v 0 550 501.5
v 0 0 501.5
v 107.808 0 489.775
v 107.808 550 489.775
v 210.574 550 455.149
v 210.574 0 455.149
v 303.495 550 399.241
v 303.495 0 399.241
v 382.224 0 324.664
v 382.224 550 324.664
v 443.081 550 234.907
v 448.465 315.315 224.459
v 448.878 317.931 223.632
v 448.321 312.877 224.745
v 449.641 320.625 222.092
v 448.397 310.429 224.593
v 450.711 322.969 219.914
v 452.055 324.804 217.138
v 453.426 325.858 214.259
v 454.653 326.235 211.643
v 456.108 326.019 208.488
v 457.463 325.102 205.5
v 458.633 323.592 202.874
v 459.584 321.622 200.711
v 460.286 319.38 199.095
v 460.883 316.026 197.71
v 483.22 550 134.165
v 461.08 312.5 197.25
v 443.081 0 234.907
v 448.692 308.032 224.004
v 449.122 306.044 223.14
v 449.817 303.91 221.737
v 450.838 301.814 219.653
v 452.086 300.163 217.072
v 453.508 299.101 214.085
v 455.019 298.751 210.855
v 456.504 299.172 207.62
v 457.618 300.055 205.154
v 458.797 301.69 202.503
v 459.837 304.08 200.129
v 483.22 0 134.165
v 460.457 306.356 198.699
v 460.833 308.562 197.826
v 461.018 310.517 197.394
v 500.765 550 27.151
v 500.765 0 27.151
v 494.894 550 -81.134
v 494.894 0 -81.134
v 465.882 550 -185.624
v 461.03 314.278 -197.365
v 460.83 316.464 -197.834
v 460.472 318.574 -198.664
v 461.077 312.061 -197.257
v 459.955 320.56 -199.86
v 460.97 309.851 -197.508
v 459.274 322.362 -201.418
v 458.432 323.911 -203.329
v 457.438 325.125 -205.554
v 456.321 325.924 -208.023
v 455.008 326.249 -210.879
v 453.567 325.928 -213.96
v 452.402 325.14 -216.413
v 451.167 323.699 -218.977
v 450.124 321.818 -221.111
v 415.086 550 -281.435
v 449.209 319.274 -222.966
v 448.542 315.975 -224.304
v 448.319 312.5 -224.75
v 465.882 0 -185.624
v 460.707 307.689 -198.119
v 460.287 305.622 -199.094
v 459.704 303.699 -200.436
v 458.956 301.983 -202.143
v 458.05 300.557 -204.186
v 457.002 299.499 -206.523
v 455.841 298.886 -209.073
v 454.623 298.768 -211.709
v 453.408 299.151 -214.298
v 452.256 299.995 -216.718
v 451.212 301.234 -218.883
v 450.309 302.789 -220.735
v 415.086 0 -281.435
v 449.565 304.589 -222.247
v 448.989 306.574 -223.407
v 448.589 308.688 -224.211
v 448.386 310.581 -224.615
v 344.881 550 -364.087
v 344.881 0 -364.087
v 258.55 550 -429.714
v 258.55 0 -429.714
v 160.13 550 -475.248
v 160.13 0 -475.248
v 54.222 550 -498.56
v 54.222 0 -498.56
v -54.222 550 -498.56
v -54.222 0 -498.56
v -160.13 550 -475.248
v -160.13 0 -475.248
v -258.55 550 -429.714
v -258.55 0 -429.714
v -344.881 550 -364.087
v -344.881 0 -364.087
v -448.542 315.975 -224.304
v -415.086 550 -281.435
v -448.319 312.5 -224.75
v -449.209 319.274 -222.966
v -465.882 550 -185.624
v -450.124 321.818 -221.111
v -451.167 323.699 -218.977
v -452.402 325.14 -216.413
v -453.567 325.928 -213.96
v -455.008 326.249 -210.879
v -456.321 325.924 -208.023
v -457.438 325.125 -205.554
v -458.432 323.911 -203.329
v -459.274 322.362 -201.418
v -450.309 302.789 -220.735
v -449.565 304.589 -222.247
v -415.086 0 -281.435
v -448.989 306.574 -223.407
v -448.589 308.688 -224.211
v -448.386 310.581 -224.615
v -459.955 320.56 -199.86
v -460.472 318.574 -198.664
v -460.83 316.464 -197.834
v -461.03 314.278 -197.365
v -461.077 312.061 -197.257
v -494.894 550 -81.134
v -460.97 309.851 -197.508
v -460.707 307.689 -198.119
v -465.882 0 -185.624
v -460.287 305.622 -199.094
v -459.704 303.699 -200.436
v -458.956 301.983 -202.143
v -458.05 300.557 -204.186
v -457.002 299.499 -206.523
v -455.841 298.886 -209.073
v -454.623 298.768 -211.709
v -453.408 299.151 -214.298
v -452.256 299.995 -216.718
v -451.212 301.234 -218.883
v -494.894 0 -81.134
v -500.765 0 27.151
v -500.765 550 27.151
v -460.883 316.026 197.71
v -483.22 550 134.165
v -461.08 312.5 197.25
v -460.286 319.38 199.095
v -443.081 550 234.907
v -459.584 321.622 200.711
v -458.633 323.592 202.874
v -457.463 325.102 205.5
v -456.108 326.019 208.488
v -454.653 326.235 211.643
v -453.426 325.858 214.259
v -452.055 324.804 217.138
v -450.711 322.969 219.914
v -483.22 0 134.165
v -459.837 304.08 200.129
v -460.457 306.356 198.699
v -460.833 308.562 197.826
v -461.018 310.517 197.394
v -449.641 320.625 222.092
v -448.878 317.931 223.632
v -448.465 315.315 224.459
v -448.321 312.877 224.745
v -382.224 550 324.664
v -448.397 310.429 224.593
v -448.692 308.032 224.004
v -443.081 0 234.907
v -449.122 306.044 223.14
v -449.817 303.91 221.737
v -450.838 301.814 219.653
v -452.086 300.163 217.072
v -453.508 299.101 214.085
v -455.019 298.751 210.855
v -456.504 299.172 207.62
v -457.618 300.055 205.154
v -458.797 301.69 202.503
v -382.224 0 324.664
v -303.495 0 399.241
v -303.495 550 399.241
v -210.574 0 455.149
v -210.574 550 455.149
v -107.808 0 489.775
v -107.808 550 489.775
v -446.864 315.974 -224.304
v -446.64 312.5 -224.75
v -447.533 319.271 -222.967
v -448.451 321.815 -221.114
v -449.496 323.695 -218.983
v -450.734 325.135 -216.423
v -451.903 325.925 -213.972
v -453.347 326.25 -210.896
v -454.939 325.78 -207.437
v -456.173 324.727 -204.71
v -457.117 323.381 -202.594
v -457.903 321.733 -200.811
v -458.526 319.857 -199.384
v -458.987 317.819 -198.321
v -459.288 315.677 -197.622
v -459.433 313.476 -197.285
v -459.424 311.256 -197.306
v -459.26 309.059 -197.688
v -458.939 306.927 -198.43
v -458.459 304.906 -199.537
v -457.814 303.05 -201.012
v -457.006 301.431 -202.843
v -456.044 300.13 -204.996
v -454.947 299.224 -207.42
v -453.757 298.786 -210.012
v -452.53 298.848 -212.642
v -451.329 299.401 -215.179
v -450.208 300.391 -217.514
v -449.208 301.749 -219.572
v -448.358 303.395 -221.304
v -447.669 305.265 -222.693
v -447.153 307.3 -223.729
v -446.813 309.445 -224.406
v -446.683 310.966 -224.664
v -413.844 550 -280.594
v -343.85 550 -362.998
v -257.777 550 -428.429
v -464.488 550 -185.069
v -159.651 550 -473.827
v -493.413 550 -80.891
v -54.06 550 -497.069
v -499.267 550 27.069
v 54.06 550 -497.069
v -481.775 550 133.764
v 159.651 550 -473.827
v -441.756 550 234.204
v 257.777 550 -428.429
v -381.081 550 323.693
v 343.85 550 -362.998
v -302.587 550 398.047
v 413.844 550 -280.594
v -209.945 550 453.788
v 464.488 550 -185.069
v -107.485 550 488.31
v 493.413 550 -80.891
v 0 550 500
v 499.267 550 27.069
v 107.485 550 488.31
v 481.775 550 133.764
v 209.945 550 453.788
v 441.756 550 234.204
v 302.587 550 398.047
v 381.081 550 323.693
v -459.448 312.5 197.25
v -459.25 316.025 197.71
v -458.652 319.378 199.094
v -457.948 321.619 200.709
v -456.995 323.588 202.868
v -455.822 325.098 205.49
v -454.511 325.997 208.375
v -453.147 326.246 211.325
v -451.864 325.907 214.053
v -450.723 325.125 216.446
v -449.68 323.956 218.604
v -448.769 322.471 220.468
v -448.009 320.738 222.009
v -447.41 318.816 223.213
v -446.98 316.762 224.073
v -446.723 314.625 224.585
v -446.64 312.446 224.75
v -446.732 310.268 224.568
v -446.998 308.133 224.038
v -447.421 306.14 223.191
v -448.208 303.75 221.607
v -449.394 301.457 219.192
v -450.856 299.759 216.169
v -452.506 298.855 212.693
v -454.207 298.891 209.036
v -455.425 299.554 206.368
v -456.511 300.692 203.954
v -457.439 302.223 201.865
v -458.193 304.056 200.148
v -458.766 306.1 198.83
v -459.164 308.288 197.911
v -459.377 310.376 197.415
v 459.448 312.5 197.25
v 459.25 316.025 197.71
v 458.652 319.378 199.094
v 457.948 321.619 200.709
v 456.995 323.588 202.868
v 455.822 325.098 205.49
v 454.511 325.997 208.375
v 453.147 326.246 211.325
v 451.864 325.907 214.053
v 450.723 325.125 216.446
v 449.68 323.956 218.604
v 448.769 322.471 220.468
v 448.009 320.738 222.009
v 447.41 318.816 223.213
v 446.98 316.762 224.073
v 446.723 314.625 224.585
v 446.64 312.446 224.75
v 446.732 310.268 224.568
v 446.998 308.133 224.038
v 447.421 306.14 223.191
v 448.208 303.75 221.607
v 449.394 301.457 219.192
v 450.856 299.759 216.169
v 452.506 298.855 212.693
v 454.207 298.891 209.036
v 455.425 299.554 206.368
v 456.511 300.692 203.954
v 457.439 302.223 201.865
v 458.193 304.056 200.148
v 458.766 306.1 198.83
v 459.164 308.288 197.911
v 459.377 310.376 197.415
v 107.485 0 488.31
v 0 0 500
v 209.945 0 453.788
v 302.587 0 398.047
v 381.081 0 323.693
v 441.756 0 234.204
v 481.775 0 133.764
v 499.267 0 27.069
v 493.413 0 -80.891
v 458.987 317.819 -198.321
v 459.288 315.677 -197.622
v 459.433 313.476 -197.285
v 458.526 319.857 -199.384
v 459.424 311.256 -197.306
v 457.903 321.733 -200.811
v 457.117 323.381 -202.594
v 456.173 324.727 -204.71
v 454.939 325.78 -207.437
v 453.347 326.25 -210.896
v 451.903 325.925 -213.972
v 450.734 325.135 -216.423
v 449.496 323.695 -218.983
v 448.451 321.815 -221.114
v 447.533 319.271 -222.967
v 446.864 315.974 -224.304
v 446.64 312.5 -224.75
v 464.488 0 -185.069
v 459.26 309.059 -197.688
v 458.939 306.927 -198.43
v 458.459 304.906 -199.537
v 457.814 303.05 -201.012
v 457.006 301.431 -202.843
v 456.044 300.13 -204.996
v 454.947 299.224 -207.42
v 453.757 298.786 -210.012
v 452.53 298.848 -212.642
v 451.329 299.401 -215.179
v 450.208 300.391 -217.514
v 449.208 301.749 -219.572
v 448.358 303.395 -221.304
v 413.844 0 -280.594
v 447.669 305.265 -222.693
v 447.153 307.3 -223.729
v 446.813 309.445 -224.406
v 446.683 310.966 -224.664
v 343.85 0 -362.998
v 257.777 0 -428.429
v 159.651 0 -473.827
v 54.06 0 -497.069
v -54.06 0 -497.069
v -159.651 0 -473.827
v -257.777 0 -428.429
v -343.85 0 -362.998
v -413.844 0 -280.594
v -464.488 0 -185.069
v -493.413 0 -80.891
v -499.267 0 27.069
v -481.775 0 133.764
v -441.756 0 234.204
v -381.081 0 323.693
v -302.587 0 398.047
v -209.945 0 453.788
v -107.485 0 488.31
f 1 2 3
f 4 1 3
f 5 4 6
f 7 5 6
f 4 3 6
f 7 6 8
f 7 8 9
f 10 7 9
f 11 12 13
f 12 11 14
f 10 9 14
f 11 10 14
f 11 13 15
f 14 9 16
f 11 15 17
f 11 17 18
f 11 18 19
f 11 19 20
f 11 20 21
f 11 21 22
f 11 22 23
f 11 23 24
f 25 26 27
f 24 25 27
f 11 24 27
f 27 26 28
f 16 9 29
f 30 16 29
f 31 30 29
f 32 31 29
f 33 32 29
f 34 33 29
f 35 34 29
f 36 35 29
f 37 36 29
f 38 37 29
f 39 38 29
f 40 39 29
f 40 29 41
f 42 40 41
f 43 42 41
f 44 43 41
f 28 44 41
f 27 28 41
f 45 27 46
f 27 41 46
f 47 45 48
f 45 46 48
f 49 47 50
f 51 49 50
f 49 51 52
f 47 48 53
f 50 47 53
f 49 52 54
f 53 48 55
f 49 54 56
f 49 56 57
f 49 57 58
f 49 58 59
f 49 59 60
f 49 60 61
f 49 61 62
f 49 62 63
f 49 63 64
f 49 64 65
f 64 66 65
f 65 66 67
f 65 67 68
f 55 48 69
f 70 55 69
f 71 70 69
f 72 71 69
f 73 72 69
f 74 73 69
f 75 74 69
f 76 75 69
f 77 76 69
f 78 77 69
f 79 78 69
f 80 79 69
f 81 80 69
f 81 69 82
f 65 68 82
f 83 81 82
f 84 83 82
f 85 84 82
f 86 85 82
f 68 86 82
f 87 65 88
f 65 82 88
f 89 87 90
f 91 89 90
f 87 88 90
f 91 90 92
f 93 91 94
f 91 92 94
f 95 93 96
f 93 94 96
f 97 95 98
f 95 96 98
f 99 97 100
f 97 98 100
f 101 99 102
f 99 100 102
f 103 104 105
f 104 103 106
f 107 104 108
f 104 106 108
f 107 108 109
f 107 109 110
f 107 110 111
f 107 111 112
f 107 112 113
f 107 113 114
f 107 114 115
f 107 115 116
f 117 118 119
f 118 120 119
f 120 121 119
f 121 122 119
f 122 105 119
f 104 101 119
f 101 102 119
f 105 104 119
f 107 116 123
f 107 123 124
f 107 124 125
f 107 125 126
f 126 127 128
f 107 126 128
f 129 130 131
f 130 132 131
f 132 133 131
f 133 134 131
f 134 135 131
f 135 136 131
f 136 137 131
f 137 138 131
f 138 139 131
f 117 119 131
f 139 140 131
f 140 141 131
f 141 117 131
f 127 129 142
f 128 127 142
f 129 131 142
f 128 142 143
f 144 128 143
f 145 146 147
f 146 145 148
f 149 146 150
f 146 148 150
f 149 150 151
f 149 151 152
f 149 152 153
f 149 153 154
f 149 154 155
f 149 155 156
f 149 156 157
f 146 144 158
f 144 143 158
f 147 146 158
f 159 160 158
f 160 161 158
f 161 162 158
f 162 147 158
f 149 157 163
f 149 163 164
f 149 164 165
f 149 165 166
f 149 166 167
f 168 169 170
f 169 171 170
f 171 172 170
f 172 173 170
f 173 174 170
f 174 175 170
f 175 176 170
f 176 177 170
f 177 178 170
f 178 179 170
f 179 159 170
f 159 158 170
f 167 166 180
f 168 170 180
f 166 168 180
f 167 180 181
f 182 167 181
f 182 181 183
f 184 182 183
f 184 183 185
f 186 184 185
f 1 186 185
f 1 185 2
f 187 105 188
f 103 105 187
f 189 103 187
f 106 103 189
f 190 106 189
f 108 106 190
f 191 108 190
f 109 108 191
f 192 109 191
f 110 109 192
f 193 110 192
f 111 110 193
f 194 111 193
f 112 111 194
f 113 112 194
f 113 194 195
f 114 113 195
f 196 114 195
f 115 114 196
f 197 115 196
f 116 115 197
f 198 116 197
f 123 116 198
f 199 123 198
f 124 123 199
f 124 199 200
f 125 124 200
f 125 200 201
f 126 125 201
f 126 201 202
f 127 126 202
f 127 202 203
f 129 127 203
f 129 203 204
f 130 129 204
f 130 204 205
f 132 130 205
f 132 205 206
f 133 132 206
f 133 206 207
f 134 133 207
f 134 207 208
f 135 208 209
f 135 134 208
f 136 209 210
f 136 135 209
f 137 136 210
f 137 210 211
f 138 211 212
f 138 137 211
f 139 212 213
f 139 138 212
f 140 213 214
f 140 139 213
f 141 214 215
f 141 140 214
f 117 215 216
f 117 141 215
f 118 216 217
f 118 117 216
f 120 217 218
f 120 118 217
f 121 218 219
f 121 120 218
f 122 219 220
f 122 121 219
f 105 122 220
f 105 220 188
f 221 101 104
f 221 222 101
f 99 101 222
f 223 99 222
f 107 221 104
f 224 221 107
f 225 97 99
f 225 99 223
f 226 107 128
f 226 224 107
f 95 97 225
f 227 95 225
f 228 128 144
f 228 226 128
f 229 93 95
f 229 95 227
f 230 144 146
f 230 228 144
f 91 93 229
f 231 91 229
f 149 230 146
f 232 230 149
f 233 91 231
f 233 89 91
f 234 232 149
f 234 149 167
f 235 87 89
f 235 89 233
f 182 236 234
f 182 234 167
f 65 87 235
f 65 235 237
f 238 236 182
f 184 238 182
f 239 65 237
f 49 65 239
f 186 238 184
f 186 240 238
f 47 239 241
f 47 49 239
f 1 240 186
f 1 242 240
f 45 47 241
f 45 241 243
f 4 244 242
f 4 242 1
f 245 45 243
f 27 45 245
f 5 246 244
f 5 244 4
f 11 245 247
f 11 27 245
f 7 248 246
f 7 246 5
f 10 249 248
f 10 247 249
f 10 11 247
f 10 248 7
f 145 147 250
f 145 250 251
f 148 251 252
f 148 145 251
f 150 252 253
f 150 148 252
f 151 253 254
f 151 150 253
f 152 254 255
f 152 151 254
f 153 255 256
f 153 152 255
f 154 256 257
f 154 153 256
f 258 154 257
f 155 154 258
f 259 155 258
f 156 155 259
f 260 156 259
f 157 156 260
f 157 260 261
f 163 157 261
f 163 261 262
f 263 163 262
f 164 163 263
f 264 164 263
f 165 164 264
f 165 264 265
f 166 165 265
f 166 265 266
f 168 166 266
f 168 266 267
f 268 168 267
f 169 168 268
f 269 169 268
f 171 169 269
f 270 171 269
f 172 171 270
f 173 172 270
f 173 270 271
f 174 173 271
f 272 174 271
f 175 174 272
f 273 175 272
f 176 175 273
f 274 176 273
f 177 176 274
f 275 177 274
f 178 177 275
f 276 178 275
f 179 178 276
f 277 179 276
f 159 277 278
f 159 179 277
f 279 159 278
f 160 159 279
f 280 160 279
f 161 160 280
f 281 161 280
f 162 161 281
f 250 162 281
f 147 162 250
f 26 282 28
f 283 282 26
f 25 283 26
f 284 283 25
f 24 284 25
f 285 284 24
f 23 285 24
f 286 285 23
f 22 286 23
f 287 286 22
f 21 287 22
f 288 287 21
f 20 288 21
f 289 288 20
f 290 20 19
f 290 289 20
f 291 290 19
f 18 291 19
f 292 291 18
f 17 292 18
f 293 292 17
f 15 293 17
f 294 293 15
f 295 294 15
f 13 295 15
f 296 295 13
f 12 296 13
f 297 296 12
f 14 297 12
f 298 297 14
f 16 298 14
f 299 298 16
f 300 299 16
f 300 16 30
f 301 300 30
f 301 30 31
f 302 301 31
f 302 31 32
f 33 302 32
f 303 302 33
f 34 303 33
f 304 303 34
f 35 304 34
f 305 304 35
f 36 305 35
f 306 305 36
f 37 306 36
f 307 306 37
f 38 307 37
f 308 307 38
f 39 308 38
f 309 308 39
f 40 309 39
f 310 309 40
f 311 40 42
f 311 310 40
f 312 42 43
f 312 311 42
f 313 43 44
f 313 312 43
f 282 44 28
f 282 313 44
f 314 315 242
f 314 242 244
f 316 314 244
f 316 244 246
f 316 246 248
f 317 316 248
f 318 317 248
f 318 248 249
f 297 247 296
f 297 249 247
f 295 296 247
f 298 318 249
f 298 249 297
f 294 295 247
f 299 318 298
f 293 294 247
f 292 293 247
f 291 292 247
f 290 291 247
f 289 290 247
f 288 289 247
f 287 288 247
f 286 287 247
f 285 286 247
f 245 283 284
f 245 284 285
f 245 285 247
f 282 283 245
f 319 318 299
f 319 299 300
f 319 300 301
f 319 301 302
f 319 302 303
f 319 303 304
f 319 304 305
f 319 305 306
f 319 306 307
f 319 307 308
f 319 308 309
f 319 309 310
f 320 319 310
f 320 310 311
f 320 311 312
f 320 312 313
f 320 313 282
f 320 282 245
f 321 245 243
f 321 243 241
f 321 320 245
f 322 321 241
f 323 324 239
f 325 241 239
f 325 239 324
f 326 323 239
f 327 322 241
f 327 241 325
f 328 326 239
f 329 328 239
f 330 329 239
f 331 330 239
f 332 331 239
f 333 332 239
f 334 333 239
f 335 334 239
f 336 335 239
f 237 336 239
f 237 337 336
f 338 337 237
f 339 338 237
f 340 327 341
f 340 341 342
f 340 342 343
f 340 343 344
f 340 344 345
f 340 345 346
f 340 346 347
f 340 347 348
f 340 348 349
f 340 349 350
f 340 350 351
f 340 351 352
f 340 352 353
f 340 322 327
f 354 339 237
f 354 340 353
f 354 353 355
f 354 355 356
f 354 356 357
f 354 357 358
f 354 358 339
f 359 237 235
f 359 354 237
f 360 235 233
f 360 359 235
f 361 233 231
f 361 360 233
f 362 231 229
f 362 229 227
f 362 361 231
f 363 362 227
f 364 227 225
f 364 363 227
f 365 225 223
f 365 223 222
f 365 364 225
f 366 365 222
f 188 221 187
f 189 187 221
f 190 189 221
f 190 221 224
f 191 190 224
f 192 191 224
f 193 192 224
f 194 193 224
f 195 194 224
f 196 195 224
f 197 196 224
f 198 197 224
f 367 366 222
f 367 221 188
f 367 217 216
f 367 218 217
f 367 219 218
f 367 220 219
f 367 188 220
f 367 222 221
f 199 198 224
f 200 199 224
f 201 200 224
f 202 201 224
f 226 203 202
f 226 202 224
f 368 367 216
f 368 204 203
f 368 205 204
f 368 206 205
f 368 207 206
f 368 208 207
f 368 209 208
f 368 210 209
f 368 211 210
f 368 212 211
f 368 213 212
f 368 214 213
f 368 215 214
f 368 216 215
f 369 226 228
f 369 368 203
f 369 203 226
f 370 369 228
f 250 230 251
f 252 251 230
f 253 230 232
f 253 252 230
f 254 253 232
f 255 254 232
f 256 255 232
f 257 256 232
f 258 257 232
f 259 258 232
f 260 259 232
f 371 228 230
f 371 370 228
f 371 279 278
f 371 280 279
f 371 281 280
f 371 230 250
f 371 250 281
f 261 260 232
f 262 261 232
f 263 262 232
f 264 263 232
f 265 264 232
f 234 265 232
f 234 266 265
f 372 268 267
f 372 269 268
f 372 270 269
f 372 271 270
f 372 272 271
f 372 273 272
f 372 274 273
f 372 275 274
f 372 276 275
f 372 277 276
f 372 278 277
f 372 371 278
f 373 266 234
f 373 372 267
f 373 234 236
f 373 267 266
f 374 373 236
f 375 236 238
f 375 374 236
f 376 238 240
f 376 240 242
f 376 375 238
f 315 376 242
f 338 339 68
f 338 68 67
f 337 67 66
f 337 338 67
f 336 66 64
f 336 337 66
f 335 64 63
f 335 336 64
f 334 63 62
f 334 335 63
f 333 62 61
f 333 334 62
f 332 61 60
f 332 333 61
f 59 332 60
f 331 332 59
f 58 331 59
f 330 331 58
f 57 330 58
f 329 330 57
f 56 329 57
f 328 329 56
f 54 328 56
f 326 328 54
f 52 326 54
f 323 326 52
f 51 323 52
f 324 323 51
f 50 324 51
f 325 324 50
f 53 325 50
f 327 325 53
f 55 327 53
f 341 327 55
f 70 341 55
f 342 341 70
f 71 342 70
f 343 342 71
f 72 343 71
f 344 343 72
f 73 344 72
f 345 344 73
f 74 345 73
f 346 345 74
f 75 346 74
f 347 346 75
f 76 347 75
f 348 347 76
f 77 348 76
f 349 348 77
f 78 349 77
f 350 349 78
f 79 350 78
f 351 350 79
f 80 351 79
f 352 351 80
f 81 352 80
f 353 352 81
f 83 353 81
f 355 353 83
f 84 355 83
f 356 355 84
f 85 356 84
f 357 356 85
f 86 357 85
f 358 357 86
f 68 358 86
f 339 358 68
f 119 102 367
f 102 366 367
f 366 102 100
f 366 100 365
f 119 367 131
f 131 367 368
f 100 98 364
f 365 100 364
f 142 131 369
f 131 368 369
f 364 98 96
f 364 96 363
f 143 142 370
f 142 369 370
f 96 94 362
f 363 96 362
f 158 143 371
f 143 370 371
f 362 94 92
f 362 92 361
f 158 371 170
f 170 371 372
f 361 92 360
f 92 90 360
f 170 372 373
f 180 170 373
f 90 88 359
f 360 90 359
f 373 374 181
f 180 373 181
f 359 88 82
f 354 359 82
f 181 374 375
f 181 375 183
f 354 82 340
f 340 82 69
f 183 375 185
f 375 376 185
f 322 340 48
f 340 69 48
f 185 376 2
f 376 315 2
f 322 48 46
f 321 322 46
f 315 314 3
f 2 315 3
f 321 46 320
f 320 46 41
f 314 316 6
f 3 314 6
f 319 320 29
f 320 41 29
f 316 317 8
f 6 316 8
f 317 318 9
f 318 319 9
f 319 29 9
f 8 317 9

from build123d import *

# Parameters (mm, degrees)
SKETCH1_R               = 501.5
SKETCH1_R_2             = 500
BOSS_EXTRUDE1_DEPTH     = 550
CUT_EXTRUDE2_DEPTH      = 898.499025069
CUT_EXTRUDE2_DEPTH_BACK = 898.499025069
SKETCH2_R               = 13.75


with BuildPart() as part:
    # Sketch1 → Boss-Extrude1 (new body)
    with BuildSketch(Plane(origin=(0, 0, 0), x_dir=(1, 0, 0), z_dir=(0, 1, 0))):
        with Locations(Location((0, 0, 0), (0, 0, 270))):
            Circle(SKETCH1_R)
        with Locations(Location((0, 0, 0), (0, 0, 270))):
            Circle(SKETCH1_R_2, mode=Mode.SUBTRACT)
    extrude(amount=BOSS_EXTRUDE1_DEPTH)

    # Sketch2 → Cut-Extrude2 (cut, two sides: drawn at the far end of the back side and taken through both)
    with BuildSketch(Plane(origin=(0, 0, 0), x_dir=(0, 0, -1), z_dir=(1, 0, 0)).offset(-CUT_EXTRUDE2_DEPTH_BACK)):
        with Locations((211, 312.5)):
            Circle(SKETCH2_R)
        with Locations((-211, 312.5)):
            Circle(SKETCH2_R)
    extrude(amount=CUT_EXTRUDE2_DEPTH + CUT_EXTRUDE2_DEPTH_BACK, mode=Mode.SUBTRACT)


solid = part.part
